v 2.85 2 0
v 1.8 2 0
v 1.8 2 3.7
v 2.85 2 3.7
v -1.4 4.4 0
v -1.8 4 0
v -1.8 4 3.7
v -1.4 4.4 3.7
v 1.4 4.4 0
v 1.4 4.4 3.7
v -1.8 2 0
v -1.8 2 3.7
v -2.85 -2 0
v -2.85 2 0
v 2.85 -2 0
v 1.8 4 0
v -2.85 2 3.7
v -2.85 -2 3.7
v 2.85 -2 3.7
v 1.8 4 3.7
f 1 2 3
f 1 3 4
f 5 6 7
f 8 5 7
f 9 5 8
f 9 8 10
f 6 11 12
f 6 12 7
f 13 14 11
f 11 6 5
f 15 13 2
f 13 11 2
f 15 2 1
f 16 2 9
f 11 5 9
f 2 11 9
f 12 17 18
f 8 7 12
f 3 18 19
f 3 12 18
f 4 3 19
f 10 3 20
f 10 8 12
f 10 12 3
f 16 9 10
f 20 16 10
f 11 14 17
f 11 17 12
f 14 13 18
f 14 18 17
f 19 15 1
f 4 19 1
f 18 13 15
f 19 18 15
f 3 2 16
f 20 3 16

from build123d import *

# Parameters (mm, degrees)
SKETCH1_W           = 5.7
SKETCH1_H           = 4
SKETCH1_W_2         = 3.6
SKETCH1_H_2         = 2.4
BOSS_EXTRUDE1_DEPTH = 3.7
CHAMFER1_SIZE       = 0.4


with BuildPart() as part:
    # Sketch1 → Boss-Extrude1 (new body)
    with BuildSketch(Plane.XY):
        Rectangle(SKETCH1_W, SKETCH1_H)
        with Locations((0, 3.2)):
            Rectangle(SKETCH1_W_2, SKETCH1_H_2)
    extrude(amount=BOSS_EXTRUDE1_DEPTH)

    # Chamfer1
    chamfer1_edges = [part.edges().sort_by_distance(p)[0] for p in [
        (-1.8, 4.4, 1.85),
        (1.8, 4.4, 1.85),
    ]]
    chamfer(chamfer1_edges, length=CHAMFER1_SIZE)


solid = part.part
